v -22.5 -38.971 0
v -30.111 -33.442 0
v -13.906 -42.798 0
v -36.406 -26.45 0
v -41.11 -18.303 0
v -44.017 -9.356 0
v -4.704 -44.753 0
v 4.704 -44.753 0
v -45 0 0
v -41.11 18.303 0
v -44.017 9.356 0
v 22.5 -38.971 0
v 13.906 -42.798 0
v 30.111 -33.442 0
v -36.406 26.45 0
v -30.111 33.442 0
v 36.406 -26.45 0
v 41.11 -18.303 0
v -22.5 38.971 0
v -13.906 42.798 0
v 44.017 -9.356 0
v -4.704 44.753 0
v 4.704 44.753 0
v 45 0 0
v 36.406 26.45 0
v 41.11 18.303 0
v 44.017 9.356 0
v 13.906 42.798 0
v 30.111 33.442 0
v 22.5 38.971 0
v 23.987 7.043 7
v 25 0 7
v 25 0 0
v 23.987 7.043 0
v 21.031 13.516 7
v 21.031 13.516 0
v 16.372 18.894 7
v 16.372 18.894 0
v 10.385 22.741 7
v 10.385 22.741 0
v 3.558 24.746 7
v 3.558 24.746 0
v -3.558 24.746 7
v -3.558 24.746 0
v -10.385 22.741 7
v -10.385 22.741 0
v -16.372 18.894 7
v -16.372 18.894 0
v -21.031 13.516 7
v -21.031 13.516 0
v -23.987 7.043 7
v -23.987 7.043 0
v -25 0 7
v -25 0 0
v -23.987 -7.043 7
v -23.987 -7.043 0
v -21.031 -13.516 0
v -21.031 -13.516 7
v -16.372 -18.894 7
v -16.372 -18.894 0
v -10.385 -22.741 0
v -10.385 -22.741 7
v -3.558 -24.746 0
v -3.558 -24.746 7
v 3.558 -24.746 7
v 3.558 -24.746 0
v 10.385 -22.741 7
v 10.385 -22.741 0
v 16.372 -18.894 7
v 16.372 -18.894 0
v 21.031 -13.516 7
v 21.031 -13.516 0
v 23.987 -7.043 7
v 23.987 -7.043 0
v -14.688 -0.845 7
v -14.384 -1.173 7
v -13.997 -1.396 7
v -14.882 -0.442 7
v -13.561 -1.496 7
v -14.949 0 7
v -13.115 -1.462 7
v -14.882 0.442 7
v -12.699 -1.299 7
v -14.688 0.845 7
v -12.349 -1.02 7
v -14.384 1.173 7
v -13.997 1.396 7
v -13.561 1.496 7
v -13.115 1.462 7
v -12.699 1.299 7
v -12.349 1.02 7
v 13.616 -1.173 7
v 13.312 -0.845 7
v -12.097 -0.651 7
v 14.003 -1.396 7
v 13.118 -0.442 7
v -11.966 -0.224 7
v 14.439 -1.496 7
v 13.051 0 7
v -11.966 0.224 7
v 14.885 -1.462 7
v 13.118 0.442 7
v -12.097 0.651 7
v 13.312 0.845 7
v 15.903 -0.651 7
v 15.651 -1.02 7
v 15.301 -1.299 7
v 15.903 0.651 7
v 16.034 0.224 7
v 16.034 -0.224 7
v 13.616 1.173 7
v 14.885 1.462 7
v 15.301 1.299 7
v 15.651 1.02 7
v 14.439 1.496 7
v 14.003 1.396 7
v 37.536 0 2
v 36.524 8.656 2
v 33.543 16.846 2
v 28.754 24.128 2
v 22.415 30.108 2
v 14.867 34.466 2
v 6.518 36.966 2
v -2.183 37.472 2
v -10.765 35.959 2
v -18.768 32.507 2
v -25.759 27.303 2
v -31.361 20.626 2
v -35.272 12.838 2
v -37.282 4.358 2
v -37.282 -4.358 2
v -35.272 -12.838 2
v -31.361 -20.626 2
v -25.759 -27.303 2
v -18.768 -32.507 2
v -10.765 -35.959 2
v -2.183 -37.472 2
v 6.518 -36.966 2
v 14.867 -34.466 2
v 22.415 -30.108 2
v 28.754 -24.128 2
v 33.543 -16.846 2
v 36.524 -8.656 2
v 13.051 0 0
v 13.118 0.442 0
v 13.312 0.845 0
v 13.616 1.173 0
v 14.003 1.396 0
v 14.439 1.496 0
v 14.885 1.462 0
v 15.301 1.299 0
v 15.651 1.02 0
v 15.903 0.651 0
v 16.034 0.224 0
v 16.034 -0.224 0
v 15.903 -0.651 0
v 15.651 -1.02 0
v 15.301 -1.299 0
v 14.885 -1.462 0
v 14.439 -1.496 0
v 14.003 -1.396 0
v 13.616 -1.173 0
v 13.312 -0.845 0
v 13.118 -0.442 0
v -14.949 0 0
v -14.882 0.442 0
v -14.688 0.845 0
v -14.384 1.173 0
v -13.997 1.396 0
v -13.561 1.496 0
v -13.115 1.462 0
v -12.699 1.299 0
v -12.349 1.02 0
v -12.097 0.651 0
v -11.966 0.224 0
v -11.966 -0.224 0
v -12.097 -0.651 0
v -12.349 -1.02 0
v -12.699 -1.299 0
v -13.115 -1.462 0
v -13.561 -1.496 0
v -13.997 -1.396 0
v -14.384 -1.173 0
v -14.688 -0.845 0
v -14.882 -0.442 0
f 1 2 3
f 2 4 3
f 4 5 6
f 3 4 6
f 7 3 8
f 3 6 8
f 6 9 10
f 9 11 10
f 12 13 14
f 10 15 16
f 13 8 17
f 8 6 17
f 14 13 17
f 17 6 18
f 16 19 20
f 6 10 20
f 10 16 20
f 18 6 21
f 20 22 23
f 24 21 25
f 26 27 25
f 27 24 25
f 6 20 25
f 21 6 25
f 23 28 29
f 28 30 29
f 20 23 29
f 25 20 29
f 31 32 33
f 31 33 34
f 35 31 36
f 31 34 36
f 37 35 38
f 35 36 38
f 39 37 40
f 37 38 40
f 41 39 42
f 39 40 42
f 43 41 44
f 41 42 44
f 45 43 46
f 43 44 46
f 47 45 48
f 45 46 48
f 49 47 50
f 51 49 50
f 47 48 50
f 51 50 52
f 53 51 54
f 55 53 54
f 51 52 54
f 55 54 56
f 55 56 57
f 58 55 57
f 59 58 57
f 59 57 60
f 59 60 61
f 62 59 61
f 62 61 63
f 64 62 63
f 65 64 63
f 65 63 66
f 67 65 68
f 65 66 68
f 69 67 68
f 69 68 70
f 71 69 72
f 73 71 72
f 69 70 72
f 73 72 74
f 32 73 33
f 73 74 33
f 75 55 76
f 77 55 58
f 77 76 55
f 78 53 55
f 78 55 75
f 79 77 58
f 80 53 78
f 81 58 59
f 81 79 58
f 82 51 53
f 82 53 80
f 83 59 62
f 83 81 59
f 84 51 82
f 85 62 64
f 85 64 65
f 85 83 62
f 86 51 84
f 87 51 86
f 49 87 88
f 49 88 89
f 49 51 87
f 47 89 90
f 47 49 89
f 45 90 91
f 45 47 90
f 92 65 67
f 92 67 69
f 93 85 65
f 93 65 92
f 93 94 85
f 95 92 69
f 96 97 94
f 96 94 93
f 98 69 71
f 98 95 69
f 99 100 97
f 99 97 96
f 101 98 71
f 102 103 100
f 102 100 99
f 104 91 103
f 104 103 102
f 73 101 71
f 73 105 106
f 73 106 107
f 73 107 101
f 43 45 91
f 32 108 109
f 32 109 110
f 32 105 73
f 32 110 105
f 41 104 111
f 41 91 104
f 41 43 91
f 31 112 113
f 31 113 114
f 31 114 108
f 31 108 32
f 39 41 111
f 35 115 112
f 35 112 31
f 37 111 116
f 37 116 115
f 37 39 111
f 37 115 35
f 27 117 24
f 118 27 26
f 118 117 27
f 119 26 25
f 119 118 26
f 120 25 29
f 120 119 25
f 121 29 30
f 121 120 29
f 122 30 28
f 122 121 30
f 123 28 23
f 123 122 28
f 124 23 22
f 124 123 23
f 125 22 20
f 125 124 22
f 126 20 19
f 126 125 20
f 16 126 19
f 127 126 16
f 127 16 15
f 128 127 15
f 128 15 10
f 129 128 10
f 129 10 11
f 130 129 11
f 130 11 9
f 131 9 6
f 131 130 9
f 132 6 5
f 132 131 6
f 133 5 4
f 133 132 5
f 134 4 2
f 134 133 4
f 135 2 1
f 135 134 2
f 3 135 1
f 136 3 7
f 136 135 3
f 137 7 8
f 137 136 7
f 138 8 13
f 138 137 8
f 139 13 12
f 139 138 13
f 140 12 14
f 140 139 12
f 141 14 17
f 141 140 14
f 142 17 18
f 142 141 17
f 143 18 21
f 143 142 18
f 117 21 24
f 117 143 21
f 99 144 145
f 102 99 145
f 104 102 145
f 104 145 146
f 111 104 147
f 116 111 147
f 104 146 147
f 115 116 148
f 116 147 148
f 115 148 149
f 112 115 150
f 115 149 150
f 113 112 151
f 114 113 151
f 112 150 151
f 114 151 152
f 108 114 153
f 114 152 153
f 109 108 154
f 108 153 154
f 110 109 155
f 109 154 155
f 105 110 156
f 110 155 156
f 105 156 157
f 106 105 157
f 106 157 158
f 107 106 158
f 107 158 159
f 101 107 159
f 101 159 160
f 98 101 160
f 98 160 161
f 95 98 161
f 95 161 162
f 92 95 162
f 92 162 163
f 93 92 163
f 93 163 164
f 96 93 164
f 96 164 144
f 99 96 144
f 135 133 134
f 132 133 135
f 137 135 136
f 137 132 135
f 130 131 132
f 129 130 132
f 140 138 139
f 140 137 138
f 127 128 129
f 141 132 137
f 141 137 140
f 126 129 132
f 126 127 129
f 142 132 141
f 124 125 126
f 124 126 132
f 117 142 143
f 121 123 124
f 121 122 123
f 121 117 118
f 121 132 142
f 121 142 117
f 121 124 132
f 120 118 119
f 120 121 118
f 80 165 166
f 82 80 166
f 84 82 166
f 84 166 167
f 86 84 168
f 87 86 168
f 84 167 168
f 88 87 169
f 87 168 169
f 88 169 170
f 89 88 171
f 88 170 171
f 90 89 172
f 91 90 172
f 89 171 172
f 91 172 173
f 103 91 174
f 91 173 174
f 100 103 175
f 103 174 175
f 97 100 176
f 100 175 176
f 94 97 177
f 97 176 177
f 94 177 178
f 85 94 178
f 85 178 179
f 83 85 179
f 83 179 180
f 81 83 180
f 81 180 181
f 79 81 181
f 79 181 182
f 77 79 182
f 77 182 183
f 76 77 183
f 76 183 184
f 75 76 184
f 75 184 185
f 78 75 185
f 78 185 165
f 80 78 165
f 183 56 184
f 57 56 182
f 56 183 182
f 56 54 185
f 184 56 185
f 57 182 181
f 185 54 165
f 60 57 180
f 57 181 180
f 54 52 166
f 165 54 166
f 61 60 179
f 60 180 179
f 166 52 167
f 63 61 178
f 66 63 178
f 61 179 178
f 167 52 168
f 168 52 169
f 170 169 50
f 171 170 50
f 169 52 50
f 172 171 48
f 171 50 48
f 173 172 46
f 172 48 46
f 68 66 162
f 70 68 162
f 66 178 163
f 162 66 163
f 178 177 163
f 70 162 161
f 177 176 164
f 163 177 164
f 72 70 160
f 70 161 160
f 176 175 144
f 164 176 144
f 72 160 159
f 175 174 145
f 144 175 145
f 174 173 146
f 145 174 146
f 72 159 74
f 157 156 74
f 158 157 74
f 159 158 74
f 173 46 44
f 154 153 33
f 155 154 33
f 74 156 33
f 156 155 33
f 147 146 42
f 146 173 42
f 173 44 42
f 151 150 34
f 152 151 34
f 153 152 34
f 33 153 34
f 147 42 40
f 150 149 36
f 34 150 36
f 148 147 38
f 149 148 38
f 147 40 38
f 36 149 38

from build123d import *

# Parameters (mm, degrees)
F0_R     = 25
F1_DEPTH = 7
F3_D     = 3
F4_R     = 45
F5_DEPTH = 2
F5_TAPER = 75


with BuildPart() as f1:
    # F0 (on Top) → F1 (new body)
    with BuildSketch(Plane.XY):
        Circle(F0_R)
    extrude(amount=F1_DEPTH)

    # F3 (through all)
    with Locations(Plane.XY.offset(7)):
        with Locations((-13.4488181525, 0), (14.5511818475, 0)):
            Hole(F3_D / 2)


with BuildPart() as f5:
    # F4 (on Top) → F5 (new body)
    with BuildSketch(Plane.XY):
        Circle(F4_R)
    extrude(amount=F5_DEPTH, taper=F5_TAPER)


solid = Compound([f1.part, f5.part])
